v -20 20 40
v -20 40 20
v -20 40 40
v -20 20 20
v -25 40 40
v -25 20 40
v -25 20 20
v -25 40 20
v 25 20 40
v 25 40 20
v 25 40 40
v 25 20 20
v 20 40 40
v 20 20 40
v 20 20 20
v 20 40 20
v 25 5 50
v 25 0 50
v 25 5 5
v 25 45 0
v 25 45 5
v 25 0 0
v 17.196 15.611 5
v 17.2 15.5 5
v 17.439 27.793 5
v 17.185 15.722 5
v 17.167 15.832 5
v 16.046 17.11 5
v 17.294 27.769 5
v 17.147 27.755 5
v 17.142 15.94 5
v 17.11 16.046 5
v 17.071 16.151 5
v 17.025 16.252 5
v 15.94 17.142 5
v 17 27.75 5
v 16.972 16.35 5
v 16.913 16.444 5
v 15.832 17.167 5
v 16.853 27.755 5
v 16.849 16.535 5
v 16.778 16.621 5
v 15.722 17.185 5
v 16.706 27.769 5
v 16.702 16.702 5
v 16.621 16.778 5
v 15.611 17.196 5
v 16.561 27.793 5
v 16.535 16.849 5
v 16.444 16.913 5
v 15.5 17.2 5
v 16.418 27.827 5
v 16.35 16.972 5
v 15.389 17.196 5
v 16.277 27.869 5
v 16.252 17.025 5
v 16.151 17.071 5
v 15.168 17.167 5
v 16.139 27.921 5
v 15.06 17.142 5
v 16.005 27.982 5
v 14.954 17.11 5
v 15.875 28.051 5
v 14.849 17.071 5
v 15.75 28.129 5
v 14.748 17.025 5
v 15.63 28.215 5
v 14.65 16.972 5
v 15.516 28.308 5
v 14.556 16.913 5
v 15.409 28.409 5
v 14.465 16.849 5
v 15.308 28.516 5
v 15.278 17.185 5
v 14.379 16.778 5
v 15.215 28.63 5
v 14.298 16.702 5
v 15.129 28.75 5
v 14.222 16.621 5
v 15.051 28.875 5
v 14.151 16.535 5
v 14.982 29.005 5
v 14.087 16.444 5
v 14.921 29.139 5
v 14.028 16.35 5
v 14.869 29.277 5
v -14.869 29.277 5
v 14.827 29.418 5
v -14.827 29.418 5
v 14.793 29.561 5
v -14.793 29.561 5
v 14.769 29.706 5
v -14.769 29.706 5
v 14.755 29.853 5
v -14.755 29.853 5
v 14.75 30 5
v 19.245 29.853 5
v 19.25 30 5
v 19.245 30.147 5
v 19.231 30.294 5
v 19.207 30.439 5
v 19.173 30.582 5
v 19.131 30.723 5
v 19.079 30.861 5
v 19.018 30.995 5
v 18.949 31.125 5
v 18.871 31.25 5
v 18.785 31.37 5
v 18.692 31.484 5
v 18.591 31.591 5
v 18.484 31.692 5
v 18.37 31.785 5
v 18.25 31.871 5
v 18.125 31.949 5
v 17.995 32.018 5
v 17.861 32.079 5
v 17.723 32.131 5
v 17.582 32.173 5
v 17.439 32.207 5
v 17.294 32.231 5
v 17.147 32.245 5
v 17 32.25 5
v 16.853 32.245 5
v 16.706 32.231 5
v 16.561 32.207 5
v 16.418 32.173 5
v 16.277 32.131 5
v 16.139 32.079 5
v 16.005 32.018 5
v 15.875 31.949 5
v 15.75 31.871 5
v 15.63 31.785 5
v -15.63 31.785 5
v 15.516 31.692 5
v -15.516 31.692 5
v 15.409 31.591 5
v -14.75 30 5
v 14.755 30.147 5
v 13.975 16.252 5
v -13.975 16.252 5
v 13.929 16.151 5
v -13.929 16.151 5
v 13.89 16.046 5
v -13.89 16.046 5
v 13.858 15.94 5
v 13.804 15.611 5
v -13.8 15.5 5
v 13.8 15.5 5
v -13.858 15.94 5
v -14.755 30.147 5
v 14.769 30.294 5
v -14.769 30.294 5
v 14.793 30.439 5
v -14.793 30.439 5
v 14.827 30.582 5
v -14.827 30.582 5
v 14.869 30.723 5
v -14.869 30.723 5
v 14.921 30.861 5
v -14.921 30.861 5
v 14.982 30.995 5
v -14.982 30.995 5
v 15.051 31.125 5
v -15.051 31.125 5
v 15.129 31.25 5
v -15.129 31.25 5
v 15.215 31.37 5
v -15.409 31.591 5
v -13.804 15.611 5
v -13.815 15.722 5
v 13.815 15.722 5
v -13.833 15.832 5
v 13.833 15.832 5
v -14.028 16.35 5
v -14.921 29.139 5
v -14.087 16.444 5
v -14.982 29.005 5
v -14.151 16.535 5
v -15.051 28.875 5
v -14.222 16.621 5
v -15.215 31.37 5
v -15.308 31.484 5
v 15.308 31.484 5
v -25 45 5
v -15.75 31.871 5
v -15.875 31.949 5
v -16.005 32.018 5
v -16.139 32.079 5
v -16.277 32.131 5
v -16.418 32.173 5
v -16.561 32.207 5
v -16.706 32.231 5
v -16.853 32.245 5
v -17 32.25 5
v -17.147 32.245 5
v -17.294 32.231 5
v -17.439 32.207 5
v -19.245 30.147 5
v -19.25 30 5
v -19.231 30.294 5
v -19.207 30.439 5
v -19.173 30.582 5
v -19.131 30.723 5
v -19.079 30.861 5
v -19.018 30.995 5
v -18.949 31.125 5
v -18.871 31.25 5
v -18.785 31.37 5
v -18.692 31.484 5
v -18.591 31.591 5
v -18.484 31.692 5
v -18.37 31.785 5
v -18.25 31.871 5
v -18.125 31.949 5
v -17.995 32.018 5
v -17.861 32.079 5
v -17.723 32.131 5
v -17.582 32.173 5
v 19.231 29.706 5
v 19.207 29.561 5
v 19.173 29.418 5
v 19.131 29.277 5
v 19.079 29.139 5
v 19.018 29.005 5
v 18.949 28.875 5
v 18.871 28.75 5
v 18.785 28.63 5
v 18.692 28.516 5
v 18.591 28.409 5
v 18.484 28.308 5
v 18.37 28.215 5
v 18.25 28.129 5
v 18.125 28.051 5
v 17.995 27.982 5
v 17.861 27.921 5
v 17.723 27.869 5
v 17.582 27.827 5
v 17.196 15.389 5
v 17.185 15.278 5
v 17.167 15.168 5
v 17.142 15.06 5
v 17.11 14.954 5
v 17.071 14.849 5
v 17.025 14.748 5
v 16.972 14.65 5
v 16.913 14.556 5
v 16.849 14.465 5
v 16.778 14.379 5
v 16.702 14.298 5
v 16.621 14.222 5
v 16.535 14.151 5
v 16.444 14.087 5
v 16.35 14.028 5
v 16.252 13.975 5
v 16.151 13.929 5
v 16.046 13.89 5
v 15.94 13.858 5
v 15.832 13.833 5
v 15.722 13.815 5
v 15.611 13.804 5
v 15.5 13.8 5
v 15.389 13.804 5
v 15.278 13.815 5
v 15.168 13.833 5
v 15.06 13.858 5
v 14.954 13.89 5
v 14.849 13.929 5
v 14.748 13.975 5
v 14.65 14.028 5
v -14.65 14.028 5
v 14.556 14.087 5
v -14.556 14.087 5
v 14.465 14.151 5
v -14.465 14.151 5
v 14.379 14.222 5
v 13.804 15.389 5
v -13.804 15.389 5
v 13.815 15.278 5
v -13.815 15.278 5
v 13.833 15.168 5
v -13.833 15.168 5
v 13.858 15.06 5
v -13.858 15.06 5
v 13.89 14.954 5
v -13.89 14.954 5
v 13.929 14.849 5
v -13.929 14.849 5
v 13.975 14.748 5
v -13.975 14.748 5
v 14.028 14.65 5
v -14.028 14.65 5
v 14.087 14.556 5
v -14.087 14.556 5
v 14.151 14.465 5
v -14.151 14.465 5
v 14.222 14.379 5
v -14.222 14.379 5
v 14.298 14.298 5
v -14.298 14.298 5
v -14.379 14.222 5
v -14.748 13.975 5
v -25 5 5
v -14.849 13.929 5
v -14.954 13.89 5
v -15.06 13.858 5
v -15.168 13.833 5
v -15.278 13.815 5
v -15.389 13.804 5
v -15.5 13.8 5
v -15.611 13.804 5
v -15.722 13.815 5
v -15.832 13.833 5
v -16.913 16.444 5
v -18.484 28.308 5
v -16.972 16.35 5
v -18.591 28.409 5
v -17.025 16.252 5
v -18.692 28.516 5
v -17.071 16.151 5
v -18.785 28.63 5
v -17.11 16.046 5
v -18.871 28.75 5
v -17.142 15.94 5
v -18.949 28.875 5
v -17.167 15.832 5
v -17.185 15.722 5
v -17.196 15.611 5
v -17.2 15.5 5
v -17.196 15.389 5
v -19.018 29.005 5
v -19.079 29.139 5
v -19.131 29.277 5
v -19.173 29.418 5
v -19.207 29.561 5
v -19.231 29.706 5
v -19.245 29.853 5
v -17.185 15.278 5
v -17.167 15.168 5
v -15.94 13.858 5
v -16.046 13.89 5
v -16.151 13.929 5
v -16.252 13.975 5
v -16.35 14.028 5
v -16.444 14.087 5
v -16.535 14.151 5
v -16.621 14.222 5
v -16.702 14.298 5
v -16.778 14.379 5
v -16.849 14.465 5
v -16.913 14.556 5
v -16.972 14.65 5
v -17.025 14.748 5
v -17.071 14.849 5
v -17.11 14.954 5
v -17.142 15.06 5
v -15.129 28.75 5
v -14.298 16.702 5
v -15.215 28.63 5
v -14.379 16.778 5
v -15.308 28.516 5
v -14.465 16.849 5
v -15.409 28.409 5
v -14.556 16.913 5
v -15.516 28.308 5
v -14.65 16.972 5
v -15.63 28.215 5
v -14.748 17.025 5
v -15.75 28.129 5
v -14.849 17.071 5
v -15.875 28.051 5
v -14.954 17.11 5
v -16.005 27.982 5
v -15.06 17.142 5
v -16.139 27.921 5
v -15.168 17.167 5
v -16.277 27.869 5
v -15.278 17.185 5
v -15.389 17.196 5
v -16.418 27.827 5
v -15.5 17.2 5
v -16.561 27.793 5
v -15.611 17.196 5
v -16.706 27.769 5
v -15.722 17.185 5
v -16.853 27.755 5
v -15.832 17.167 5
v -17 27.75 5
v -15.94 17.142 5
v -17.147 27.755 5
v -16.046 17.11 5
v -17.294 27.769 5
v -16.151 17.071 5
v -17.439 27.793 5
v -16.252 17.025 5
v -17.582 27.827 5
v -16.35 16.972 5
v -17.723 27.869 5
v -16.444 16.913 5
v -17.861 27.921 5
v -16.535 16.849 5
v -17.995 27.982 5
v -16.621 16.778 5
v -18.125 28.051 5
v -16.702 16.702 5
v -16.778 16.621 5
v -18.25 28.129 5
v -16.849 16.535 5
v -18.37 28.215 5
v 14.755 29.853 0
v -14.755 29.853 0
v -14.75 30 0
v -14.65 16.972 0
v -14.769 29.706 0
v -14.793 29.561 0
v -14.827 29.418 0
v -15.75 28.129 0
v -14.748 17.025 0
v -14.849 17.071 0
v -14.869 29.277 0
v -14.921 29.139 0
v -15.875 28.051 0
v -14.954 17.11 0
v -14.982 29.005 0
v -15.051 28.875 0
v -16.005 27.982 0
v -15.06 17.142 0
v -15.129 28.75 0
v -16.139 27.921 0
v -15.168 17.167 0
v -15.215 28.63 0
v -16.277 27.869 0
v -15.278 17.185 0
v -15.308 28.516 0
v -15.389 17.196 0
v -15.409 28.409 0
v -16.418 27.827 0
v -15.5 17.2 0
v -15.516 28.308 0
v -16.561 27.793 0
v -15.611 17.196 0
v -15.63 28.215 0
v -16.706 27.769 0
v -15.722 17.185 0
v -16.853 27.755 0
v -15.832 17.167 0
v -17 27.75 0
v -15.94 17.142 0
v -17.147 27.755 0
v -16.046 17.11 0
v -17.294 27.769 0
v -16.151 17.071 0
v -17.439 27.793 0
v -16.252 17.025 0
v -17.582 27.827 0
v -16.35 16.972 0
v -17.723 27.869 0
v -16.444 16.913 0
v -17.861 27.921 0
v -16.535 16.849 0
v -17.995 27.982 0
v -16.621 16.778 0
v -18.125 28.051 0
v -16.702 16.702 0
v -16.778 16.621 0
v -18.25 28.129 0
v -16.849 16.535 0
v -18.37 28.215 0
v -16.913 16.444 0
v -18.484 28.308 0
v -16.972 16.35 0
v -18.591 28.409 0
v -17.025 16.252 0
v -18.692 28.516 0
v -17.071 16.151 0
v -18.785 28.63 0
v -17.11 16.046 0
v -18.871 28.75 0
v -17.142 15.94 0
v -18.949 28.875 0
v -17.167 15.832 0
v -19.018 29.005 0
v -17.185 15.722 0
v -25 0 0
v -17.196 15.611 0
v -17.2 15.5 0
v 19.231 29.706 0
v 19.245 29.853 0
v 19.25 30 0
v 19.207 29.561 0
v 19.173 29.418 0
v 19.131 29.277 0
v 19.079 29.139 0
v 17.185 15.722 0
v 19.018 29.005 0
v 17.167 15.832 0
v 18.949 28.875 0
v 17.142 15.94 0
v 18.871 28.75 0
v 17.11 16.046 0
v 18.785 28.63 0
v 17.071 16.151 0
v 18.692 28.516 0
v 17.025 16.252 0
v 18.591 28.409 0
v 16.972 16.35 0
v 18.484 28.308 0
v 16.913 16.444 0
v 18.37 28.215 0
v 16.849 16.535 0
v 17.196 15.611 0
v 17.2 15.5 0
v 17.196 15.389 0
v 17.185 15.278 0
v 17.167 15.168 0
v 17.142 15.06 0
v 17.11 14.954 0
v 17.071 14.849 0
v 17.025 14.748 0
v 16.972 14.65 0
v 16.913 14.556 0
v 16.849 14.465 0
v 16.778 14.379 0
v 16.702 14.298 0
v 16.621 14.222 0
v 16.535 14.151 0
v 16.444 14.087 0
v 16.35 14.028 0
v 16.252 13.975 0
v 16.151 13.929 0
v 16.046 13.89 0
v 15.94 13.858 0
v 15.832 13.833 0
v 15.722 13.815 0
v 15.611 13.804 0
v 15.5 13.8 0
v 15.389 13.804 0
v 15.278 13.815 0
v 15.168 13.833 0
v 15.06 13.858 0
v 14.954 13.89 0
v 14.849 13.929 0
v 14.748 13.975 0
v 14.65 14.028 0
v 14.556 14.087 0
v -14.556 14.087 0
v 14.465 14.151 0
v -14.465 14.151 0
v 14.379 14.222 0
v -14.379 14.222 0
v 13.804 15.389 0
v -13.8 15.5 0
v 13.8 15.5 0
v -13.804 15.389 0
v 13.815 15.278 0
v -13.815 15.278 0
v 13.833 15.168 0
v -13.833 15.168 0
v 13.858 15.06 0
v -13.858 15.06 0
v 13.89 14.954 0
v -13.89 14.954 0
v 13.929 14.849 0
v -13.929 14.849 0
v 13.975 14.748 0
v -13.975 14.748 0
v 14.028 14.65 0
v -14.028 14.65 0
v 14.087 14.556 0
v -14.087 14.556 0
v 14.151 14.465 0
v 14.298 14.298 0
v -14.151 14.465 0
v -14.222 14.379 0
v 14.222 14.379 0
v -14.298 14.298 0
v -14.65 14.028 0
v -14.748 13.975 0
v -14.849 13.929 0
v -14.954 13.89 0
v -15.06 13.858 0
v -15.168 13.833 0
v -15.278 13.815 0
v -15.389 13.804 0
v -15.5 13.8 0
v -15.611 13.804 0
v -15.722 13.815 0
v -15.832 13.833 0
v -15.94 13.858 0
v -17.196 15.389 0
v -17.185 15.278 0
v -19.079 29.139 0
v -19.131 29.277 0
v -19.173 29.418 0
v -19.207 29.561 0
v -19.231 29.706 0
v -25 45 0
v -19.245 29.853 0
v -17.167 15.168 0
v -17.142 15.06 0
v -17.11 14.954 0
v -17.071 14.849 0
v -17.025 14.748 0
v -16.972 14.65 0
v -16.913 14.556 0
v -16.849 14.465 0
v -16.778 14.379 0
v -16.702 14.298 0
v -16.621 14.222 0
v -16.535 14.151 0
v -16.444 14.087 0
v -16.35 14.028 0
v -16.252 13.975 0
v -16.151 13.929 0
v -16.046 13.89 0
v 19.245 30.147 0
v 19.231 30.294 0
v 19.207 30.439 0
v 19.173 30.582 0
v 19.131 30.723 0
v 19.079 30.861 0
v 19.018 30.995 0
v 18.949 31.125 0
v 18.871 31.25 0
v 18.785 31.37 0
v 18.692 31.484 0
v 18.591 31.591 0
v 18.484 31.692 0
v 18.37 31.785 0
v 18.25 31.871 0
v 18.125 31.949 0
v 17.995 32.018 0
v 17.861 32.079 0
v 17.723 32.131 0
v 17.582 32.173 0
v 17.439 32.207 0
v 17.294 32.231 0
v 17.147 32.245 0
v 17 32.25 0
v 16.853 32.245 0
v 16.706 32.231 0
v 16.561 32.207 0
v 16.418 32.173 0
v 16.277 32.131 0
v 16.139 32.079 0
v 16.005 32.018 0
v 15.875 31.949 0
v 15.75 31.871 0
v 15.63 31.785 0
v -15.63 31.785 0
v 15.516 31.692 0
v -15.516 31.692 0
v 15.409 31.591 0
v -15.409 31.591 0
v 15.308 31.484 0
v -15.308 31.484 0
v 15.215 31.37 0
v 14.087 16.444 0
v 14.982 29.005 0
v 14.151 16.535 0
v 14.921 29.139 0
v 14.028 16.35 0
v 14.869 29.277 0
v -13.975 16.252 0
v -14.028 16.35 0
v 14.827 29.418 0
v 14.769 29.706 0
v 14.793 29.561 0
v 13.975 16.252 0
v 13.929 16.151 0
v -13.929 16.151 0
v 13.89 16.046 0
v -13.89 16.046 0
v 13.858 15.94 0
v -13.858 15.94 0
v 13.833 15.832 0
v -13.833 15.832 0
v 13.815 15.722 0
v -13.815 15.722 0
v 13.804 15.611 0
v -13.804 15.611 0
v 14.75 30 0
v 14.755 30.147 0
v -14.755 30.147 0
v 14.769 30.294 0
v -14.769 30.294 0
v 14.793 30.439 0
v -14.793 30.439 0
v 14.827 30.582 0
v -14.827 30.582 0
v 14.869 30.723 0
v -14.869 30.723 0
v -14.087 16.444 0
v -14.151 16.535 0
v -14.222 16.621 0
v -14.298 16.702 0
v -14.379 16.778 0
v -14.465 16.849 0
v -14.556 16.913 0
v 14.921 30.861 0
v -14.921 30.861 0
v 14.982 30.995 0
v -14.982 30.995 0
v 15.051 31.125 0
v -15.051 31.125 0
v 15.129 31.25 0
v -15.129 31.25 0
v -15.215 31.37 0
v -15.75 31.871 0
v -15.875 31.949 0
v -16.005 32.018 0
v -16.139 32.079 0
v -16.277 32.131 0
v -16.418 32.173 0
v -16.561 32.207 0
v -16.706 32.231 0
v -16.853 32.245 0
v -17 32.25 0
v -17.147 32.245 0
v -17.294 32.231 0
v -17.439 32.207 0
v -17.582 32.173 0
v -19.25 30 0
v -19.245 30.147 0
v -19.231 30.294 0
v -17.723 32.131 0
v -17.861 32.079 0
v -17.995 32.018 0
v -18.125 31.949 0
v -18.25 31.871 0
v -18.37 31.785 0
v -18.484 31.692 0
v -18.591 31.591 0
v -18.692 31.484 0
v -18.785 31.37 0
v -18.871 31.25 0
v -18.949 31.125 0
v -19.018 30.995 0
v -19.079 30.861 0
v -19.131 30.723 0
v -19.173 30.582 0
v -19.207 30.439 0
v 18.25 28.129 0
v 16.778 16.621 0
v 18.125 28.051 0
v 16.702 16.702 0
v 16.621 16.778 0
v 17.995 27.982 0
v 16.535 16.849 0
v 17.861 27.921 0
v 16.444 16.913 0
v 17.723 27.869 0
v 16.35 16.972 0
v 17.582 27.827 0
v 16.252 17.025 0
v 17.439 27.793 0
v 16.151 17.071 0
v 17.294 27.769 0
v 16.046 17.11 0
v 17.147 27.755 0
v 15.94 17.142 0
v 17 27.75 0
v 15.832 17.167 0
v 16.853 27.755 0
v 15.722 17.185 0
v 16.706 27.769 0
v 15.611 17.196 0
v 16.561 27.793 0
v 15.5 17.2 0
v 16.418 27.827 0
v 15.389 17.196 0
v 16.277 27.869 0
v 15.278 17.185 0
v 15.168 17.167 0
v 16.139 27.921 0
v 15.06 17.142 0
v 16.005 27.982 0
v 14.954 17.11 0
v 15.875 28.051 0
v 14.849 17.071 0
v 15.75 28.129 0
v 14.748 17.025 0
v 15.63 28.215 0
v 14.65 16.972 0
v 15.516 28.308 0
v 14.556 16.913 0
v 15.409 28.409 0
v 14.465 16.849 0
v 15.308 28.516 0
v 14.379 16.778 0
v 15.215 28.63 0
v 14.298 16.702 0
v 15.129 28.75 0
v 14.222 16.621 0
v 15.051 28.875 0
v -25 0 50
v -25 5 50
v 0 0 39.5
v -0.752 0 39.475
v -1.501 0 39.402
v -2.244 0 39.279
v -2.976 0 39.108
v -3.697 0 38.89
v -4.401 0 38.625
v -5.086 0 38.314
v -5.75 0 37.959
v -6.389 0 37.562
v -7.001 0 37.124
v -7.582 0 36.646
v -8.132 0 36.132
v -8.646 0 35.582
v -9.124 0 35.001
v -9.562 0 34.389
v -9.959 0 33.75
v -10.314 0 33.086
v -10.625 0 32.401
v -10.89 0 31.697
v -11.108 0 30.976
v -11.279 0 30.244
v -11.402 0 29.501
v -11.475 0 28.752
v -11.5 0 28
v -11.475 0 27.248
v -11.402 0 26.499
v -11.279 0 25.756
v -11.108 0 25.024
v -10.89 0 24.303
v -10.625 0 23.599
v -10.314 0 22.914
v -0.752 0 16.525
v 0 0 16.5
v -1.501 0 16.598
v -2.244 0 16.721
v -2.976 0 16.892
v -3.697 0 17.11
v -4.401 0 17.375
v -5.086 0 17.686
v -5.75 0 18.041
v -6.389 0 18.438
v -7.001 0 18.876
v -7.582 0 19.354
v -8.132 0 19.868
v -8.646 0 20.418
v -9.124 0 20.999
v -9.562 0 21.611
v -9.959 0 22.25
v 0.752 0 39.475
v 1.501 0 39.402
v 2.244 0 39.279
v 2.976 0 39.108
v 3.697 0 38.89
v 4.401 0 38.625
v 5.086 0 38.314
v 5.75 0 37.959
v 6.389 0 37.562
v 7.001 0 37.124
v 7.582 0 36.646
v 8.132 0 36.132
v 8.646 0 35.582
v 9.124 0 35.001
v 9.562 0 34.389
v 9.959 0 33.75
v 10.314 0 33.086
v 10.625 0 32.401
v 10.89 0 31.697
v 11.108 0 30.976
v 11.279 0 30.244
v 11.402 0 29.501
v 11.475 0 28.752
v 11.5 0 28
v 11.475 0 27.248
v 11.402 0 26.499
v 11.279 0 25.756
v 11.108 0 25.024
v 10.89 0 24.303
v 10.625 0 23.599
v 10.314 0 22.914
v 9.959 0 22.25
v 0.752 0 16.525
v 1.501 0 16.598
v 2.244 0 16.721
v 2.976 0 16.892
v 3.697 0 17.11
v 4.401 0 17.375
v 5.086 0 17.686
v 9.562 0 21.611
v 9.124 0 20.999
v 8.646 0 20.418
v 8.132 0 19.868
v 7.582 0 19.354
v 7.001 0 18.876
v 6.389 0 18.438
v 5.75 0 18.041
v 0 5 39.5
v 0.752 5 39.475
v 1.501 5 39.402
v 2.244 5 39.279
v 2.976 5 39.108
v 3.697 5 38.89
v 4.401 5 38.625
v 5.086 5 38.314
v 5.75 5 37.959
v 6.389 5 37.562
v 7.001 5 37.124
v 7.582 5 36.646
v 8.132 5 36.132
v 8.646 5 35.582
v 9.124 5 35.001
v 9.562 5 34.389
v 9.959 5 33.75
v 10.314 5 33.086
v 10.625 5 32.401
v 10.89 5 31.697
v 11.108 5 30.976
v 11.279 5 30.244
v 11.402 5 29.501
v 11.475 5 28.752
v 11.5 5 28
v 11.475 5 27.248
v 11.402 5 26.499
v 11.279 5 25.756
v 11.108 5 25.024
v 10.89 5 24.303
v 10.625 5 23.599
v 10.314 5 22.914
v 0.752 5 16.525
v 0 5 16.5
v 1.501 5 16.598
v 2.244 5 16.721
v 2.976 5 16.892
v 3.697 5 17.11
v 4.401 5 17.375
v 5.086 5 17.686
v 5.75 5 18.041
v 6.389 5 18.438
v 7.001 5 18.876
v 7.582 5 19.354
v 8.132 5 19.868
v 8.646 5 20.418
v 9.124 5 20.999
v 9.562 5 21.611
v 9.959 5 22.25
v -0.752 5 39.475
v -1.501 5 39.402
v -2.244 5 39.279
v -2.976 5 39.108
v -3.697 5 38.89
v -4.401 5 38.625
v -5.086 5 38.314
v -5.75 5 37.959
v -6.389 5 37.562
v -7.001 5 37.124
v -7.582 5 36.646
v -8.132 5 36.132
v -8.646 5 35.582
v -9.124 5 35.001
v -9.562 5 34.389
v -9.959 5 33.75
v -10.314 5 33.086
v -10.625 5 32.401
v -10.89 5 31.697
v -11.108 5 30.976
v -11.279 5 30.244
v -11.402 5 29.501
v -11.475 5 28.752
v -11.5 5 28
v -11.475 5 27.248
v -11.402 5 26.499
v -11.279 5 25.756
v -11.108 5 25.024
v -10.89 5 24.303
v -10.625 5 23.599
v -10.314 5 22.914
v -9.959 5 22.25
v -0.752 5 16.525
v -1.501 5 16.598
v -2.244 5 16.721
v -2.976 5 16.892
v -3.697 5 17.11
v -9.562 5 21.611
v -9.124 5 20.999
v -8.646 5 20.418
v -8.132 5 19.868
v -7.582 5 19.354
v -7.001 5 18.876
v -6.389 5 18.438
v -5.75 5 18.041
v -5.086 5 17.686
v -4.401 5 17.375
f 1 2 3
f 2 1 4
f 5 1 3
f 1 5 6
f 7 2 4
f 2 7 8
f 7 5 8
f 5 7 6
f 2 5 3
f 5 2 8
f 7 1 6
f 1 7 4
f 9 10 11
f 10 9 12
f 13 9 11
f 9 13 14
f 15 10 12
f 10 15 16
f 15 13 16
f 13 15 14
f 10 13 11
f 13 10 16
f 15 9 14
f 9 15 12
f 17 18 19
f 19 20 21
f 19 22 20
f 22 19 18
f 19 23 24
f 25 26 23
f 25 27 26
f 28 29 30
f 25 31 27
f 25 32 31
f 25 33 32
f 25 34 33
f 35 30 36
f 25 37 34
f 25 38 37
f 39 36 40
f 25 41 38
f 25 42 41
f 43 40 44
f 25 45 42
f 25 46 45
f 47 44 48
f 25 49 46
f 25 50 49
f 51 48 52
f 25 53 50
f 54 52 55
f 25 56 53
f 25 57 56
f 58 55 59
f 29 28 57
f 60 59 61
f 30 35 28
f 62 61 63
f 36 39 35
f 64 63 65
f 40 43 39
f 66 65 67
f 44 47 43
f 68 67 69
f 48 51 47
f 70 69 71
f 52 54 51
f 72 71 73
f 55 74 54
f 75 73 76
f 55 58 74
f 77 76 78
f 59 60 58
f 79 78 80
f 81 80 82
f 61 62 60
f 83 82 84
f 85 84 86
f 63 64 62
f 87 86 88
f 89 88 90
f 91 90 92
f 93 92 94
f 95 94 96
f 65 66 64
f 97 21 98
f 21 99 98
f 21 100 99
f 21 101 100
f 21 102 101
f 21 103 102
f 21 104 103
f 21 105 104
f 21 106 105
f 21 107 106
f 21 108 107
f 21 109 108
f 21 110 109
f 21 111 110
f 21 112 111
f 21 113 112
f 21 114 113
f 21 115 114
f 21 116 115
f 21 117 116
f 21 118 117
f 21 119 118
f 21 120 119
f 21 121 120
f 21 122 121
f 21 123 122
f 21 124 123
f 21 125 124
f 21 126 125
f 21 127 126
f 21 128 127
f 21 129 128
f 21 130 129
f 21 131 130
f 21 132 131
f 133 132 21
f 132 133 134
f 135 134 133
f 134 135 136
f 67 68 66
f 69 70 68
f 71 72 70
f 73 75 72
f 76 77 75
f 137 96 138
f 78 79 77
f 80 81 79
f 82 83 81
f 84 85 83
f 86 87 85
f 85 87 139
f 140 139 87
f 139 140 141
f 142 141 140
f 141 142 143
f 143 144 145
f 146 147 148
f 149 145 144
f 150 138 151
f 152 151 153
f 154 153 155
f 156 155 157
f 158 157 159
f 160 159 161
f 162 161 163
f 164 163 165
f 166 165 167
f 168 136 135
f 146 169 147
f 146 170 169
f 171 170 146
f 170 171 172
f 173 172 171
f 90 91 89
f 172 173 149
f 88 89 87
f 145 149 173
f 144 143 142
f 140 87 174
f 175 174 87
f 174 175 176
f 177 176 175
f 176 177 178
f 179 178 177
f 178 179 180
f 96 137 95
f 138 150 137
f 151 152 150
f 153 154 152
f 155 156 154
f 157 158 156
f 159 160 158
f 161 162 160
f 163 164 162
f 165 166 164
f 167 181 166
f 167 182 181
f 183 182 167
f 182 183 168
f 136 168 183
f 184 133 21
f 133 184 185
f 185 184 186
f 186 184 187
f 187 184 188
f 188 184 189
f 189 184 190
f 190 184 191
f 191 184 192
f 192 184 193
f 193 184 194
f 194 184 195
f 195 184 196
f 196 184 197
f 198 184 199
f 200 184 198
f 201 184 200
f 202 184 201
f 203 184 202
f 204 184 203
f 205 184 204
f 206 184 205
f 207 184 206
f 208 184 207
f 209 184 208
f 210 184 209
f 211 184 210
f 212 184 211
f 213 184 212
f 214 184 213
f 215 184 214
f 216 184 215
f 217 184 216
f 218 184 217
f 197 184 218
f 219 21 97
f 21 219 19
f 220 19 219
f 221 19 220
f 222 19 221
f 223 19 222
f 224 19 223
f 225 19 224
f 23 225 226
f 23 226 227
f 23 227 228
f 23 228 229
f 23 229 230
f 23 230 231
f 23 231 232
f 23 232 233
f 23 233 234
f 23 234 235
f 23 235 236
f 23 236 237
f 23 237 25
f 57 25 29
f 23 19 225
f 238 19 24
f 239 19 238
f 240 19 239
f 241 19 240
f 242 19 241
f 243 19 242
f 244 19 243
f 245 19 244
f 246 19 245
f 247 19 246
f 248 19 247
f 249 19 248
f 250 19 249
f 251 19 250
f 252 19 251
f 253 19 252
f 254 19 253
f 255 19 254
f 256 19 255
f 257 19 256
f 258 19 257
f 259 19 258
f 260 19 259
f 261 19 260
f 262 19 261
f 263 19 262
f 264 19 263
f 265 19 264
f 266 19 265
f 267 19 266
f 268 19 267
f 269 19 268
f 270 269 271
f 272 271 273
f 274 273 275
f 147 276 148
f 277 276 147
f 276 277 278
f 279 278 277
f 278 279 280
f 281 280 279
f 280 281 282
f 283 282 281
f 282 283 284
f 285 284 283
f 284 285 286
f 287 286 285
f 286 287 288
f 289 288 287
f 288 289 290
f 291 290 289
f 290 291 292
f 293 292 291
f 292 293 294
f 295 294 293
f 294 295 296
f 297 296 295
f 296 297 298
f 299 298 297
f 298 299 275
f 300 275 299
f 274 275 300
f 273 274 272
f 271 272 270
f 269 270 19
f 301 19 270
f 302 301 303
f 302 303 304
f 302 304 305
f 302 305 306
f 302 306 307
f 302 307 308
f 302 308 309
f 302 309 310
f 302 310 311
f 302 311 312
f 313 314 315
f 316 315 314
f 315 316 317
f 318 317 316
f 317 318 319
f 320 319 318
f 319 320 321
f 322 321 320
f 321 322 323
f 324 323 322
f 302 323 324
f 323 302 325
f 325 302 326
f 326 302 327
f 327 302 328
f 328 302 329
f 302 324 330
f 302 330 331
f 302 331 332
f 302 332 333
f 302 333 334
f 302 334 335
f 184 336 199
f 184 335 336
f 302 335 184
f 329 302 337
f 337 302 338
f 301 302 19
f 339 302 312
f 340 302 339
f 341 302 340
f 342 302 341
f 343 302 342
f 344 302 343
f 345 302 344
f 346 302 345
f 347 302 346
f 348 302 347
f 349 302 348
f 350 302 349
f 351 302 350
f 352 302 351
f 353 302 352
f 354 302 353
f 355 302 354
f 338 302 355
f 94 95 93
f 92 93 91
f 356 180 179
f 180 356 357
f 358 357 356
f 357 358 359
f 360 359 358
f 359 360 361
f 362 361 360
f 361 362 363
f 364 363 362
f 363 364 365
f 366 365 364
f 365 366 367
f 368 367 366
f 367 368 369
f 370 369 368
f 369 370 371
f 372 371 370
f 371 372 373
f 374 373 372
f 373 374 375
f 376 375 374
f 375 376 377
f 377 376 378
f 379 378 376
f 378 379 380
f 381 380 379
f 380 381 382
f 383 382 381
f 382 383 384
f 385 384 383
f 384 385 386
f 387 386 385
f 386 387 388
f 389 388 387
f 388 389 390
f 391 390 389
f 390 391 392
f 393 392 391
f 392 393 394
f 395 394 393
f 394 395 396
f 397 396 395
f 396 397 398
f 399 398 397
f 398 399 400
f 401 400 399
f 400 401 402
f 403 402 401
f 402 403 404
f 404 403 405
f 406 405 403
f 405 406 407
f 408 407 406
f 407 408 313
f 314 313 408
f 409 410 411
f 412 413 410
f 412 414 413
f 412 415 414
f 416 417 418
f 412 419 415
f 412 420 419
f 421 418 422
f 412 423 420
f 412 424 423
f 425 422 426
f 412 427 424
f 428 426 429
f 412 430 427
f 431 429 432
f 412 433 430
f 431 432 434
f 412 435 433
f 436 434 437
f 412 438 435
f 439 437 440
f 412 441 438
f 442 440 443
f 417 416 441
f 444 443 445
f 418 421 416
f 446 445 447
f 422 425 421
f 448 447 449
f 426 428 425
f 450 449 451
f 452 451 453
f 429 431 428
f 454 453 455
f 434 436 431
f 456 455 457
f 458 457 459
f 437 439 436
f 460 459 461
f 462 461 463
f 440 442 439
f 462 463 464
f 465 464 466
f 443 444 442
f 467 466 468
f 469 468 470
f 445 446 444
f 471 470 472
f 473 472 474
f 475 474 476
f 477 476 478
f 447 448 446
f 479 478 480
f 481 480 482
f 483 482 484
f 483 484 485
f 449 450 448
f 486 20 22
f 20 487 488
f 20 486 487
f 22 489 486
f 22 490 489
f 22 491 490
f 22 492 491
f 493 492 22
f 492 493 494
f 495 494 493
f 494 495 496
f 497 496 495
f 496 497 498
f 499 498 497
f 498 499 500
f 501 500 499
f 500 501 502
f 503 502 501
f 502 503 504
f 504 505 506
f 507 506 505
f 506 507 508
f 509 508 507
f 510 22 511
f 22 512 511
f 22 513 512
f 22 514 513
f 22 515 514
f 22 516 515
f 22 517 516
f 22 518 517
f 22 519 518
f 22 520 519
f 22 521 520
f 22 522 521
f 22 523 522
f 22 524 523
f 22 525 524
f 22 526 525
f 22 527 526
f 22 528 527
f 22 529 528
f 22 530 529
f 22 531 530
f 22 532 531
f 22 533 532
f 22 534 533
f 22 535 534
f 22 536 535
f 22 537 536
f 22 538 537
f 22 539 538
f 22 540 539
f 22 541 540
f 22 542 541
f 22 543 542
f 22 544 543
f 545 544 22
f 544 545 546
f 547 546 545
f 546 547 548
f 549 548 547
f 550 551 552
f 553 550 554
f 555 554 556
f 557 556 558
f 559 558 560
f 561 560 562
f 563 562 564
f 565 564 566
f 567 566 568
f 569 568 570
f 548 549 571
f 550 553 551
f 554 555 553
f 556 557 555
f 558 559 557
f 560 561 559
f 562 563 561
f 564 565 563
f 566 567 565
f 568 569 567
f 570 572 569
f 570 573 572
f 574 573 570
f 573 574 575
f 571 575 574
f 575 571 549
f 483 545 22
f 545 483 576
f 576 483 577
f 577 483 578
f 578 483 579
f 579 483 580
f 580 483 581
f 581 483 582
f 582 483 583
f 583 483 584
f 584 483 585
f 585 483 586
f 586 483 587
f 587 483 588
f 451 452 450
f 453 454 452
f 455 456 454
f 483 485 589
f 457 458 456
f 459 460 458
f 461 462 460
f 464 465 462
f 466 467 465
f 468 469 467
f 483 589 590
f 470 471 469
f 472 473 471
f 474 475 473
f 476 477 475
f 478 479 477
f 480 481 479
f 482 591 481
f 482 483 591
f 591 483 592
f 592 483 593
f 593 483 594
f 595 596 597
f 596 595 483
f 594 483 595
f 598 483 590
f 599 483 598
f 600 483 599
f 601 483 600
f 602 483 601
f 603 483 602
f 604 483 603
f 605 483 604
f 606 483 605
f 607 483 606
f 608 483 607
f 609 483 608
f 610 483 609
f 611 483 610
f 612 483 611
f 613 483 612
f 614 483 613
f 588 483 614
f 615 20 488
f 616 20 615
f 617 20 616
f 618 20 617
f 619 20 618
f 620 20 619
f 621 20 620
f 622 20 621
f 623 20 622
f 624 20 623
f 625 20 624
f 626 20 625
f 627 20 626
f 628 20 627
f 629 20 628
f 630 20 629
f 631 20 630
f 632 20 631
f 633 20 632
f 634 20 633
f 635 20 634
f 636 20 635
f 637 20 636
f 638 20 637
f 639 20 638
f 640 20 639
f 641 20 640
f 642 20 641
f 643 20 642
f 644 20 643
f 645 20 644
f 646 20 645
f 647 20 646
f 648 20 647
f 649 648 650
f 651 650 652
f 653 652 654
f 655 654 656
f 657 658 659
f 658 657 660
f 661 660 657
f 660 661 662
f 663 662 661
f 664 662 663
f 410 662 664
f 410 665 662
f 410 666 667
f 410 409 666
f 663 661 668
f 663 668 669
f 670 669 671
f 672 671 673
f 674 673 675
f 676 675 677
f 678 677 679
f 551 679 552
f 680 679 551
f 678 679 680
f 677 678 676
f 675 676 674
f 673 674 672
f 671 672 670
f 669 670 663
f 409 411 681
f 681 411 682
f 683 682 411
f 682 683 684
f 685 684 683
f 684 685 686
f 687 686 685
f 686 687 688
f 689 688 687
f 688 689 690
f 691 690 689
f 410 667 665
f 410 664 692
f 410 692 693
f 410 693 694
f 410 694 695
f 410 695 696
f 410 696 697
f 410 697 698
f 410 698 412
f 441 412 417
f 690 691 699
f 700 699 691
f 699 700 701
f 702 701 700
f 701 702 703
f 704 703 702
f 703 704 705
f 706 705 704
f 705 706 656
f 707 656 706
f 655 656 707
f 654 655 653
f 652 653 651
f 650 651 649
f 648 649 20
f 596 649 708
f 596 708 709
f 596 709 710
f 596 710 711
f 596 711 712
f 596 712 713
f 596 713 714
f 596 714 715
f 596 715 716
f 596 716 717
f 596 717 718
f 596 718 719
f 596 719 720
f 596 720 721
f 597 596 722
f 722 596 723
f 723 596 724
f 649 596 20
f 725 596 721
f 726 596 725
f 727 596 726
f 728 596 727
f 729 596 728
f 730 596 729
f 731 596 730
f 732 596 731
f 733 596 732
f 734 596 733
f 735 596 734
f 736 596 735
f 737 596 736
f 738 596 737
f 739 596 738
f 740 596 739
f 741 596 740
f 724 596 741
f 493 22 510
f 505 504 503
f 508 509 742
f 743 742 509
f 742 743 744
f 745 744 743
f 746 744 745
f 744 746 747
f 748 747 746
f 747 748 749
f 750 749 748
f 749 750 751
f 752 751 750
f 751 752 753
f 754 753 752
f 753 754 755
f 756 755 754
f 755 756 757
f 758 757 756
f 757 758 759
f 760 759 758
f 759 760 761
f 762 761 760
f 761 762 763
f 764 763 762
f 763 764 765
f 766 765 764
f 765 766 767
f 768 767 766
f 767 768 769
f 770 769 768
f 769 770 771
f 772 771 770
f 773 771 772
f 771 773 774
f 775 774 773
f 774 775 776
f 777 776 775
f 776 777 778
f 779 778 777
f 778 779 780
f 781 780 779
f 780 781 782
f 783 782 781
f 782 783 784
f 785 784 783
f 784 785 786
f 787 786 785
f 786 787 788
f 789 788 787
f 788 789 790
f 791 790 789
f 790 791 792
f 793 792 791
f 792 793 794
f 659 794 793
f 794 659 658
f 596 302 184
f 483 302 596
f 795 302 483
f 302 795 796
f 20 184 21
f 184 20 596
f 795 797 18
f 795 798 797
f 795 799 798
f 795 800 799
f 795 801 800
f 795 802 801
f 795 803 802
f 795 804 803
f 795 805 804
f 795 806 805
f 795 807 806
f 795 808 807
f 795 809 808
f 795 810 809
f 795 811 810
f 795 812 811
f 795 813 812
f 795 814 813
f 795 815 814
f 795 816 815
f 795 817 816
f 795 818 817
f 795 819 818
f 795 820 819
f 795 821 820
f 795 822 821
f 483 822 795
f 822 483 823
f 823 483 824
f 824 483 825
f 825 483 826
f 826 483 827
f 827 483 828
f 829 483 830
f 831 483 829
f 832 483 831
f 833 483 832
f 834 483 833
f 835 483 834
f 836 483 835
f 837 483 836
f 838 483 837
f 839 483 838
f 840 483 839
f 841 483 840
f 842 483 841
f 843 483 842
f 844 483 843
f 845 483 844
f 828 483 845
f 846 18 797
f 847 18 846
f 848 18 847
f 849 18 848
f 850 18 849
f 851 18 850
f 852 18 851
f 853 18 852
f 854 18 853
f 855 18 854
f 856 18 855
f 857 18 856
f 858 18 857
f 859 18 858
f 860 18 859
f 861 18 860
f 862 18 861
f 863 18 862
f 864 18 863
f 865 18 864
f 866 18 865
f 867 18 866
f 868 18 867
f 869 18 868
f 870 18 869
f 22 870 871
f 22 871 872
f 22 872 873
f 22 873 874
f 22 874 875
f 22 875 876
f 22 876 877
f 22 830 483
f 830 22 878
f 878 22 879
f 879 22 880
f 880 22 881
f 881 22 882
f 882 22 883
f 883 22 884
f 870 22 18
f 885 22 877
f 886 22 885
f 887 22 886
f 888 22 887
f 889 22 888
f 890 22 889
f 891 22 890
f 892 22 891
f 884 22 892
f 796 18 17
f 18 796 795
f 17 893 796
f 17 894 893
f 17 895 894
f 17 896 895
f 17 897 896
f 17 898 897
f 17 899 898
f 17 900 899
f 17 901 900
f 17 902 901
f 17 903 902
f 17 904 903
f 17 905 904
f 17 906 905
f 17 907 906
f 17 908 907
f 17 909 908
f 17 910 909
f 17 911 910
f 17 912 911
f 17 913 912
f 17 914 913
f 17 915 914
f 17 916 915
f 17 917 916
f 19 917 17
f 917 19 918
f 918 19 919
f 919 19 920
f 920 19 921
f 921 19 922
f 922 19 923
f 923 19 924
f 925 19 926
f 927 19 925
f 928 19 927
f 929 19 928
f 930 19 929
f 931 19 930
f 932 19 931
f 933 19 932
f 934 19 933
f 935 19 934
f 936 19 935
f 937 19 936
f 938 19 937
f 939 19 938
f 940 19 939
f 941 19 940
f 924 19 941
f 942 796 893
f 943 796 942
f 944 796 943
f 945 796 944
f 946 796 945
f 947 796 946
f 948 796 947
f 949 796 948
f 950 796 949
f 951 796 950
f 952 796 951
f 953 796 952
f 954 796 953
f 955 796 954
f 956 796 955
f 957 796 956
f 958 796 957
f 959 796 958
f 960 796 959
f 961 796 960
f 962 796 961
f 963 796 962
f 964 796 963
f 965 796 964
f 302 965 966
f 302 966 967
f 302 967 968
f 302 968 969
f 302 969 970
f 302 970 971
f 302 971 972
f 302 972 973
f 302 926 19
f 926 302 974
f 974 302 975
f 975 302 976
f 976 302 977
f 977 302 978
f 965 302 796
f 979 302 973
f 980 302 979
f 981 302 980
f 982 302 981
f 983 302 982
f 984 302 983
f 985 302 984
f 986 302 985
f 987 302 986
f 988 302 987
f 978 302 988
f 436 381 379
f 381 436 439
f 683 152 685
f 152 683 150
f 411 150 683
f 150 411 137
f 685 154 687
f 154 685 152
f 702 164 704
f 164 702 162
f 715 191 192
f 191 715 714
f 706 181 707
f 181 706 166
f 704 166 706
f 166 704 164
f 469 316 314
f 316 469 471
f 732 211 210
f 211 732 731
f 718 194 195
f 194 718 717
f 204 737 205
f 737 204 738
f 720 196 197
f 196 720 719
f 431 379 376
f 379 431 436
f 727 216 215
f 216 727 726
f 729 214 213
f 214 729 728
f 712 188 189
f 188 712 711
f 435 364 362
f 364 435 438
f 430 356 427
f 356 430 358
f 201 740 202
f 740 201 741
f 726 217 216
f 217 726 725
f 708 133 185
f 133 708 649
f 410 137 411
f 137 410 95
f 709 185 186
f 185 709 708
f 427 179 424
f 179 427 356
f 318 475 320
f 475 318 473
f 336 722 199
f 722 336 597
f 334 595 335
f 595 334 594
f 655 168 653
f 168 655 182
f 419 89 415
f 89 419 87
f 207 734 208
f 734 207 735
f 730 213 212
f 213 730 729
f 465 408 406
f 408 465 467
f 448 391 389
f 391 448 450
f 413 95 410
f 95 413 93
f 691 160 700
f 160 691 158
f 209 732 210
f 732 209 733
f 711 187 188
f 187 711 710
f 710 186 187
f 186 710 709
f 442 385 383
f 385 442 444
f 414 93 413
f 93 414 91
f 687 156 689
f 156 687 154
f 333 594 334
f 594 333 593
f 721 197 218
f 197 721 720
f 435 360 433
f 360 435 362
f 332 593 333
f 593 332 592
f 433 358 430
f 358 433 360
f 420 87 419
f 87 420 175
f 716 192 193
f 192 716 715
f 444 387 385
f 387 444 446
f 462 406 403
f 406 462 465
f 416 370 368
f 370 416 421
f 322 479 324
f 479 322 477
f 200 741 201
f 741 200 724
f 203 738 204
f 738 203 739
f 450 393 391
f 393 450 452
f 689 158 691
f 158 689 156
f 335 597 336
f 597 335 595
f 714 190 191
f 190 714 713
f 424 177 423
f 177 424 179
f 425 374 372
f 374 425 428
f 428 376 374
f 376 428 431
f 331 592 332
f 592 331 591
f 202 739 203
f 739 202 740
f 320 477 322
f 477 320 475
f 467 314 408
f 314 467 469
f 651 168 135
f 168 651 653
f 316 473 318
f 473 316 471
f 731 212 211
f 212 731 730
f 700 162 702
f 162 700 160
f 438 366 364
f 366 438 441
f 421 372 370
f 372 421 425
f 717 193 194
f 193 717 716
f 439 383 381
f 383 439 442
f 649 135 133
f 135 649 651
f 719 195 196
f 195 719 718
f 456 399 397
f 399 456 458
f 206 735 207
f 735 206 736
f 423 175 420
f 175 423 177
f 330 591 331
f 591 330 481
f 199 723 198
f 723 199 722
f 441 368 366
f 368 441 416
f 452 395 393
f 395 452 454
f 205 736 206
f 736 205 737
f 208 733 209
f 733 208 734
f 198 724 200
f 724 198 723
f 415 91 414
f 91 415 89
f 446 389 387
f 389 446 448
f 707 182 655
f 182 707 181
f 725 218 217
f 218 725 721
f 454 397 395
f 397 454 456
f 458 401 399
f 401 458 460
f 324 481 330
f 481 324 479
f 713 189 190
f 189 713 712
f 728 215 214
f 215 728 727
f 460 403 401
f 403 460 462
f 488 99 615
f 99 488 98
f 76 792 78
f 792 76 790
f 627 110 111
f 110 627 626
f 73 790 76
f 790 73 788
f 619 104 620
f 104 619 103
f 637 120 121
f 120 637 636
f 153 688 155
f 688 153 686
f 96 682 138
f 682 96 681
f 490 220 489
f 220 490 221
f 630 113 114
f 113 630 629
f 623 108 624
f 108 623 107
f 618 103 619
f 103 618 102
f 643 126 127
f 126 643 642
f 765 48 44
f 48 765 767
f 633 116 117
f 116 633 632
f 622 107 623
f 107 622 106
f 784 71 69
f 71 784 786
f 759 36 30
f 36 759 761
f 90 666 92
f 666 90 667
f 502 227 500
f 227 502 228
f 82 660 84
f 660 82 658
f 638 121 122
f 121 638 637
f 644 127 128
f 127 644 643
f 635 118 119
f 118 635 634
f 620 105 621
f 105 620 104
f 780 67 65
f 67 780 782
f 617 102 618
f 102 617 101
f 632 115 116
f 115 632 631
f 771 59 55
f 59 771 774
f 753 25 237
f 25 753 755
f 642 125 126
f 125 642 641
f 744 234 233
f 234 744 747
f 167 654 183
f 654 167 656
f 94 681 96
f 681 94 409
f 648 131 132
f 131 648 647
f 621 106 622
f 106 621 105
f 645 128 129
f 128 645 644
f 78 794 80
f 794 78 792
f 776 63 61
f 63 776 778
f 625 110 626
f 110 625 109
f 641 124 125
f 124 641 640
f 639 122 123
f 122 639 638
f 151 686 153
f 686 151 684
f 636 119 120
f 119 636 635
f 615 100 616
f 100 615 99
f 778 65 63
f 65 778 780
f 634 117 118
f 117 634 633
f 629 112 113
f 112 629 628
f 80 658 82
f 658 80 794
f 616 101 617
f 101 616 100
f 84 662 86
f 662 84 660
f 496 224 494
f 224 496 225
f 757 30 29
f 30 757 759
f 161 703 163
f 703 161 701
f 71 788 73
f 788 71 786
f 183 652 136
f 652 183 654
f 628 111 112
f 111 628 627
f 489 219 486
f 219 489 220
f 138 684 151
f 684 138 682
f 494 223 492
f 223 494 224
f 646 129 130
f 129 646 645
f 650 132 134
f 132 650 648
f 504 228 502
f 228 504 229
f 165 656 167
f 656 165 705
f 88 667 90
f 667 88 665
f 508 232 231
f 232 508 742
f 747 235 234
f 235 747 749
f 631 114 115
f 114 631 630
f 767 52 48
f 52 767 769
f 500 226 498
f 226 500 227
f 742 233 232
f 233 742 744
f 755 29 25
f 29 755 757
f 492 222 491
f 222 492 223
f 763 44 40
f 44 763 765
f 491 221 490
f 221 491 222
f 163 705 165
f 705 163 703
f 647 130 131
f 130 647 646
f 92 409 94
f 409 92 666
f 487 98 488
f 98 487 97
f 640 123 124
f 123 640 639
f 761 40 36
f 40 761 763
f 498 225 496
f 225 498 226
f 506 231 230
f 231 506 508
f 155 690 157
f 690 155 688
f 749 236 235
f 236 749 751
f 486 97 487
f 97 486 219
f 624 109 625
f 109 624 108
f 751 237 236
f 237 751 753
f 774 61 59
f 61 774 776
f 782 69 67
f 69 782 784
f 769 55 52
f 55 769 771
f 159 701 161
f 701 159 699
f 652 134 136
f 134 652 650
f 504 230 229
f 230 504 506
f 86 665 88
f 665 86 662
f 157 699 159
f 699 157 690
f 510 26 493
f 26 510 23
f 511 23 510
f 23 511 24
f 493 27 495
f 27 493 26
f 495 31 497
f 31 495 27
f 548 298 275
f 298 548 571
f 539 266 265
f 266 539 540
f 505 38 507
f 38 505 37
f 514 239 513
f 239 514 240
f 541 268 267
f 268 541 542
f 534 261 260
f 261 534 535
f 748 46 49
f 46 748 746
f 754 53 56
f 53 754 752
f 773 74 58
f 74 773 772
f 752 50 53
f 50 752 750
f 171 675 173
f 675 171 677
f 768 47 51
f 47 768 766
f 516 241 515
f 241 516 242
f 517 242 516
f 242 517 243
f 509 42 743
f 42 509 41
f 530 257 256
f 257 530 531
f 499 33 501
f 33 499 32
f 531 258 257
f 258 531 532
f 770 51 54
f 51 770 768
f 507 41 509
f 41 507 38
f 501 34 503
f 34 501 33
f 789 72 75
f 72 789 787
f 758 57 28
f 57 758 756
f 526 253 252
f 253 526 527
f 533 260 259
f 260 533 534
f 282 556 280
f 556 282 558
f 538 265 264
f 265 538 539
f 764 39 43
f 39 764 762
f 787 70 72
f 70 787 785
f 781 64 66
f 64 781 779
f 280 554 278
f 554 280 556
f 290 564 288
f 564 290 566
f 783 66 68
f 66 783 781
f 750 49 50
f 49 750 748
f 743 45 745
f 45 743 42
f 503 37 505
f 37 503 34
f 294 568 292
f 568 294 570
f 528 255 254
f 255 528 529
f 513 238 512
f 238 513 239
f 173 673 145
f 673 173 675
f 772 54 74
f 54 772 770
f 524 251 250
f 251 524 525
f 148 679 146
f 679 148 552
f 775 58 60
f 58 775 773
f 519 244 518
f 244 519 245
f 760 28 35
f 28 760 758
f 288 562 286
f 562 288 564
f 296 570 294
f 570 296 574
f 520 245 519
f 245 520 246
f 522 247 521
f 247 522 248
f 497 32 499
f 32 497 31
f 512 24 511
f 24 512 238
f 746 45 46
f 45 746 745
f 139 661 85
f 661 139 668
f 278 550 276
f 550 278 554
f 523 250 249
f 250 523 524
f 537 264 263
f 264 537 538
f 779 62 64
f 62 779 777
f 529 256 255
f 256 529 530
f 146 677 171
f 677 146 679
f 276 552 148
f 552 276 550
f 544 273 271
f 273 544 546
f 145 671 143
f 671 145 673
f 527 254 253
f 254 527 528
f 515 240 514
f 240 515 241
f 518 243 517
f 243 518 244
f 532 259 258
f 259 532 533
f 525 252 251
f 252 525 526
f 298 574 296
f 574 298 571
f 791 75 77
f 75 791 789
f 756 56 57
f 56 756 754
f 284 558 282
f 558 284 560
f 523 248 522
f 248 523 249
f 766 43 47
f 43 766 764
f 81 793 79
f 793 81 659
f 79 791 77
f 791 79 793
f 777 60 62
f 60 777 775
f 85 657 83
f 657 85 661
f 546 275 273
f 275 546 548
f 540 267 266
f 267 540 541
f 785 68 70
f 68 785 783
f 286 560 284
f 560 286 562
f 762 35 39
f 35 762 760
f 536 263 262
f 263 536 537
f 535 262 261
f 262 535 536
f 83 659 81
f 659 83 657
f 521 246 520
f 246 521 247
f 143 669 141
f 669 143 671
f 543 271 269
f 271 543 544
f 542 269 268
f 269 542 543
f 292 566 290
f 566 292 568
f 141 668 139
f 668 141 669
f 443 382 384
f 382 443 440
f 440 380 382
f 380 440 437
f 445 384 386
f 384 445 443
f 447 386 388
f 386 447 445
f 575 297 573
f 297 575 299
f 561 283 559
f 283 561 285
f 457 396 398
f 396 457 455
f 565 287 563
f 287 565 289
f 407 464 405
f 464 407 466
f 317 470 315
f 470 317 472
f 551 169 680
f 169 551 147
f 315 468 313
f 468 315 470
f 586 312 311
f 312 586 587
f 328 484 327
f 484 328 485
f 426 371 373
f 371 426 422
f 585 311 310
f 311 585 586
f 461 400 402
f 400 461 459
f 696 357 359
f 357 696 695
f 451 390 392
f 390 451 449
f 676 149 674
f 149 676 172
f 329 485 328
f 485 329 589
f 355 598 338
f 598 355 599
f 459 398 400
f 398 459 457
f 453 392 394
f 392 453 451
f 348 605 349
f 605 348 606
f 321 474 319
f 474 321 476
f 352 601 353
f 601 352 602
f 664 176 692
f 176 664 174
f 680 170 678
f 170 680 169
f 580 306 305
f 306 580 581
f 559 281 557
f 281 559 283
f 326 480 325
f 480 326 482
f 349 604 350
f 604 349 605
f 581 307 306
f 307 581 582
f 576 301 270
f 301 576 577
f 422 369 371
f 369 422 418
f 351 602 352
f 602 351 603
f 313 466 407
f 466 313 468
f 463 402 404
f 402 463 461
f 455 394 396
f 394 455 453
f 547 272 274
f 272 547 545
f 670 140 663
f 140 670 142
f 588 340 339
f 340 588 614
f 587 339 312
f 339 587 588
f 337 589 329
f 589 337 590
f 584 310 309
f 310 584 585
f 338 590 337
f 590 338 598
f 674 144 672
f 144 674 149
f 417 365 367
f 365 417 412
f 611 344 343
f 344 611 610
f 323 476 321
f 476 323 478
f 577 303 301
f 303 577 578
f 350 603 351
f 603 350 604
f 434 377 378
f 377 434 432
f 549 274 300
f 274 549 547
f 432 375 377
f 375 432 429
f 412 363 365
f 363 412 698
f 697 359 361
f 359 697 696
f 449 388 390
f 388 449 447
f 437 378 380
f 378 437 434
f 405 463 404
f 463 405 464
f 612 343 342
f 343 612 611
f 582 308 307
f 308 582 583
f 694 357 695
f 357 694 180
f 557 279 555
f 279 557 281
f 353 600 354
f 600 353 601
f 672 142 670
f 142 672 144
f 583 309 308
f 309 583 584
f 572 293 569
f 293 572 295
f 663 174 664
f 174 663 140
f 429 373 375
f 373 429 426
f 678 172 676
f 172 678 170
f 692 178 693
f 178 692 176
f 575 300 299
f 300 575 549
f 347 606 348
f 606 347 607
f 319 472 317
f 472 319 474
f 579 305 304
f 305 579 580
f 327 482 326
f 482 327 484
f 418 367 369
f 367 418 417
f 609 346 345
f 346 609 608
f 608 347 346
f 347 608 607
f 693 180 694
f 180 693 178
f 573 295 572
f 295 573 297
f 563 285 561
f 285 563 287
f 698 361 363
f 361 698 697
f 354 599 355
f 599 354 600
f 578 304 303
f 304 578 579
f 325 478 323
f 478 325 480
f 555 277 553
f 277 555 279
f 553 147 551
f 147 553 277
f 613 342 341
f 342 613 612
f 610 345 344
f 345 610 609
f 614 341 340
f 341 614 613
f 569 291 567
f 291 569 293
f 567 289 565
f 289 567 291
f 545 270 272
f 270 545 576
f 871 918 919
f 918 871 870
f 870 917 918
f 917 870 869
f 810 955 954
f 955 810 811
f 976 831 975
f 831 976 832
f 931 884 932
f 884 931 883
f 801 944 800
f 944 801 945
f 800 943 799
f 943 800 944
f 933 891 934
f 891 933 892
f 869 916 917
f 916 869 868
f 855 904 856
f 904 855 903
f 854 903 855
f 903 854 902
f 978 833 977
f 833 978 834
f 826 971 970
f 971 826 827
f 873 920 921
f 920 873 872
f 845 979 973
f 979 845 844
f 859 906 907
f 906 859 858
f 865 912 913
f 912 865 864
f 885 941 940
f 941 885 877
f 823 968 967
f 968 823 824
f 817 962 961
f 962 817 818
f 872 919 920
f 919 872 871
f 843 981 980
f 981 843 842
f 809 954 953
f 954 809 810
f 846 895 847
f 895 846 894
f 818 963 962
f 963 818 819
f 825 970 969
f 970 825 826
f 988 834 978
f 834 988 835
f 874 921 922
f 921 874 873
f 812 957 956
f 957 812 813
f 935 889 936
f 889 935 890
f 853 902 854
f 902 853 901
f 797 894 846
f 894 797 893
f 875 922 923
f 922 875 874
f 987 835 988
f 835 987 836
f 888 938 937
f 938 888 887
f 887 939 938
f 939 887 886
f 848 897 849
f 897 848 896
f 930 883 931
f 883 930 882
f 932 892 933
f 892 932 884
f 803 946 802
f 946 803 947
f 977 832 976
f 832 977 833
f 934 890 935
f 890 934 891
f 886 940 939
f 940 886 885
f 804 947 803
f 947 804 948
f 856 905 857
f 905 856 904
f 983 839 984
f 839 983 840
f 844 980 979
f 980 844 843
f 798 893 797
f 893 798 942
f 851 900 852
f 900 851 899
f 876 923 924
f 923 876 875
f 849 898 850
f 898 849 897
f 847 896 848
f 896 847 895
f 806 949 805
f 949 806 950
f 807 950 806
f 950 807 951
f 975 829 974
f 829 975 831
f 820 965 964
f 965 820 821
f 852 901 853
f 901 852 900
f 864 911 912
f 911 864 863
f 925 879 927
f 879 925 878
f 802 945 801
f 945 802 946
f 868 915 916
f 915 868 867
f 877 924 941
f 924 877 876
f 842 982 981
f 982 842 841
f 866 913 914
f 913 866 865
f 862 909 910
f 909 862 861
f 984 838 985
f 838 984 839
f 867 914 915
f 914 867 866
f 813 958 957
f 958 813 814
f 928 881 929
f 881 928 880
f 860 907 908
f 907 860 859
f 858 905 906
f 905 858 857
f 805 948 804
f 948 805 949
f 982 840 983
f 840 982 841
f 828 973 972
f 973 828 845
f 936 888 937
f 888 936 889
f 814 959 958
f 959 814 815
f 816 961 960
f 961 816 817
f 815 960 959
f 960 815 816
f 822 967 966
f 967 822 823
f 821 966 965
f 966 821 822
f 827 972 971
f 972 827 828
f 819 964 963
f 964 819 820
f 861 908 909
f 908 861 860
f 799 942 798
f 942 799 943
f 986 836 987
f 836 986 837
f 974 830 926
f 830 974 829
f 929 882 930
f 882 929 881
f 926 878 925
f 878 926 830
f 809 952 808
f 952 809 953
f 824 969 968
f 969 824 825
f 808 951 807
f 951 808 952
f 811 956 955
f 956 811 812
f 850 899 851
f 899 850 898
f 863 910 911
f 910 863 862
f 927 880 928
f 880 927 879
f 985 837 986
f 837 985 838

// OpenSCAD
// L-shaped mounting bracket for NEMA 17 stepper motor (syringe pump)
// Print orientation: base plate on bed, motor plate builds upward (+Z)

// ---------------- Parameters ----------------
plate_w      = 50;    // base plate length (X)
plate_h      = 45;    // base plate width (Y)
plate_t      = 5;     // base plate thickness (Z)

hole_x       = 17;    // M4 hole offset from origin (±X)
hole_y       = 30;    // M4 hole position (Y)
hole_d       = 4.5;   // M4 hole diameter

motor_w      = 50;    // motor plate length (X)
motor_h      = 5;     // motor plate width (Y)
motor_z      = 50;    // motor plate height (Z)

boss_d       = 23;    // motor centring boss hole diameter
boss_x       = 0;     // boss hole centre X
boss_z       = 28;    // boss hole centre Z

screw_d      = 3.4;   // M3 screw hole diameter
screw_pitch  = 31;    // square pattern side length

gusset_t     = 5;     // gusset thickness (X)
gusset_leg   = 20;    // right-triangle leg length (Y and Z)

eps          = 0.5;   // cutter overshoot past faces
$fn          = 96;    // curve resolution

// ---------------- Model ----------------
difference() {
    union() {
        // Base plate
        translate([-plate_w/2, 0, 0])
            cube([plate_w, plate_h, plate_t]);

        // Vertical motor plate (on back edge of base)
        translate([-motor_w/2, 0, 0])
            cube([motor_w, motor_h, motor_z]);

        // Gussets: right-triangle in YZ, flush with left/right edges
        for (sx = [-1, 1])
            translate([sx > 0 ? motor_w/2 - gusset_t : -motor_w/2,
                       gusset_leg, gusset_leg])
                cube([gusset_t, gusset_leg, gusset_leg]);
    }

    // Base plate through-holes (M4)
    for (x = [-hole_x, hole_x])
        translate([x, hole_y, -eps])
            cylinder(d = hole_d, h = plate_t + 2*eps);

    // Motor plate boss hole (along Y)
    translate([boss_x, -eps, boss_z])
        rotate([-90, 0, 0])
            cylinder(d = boss_d, h = motor_h + 2*eps);

    // M3 screw holes on square pattern, centred on boss hole
    for (a = [0, 90, 180, 270])
        rotate([0, 0, a])
            translate([screw_pitch/2, screw_pitch/2, 0])
                translate([0, 0, -eps])
                    cylinder(d = screw_d, h = motor_h + 2*eps);
}
